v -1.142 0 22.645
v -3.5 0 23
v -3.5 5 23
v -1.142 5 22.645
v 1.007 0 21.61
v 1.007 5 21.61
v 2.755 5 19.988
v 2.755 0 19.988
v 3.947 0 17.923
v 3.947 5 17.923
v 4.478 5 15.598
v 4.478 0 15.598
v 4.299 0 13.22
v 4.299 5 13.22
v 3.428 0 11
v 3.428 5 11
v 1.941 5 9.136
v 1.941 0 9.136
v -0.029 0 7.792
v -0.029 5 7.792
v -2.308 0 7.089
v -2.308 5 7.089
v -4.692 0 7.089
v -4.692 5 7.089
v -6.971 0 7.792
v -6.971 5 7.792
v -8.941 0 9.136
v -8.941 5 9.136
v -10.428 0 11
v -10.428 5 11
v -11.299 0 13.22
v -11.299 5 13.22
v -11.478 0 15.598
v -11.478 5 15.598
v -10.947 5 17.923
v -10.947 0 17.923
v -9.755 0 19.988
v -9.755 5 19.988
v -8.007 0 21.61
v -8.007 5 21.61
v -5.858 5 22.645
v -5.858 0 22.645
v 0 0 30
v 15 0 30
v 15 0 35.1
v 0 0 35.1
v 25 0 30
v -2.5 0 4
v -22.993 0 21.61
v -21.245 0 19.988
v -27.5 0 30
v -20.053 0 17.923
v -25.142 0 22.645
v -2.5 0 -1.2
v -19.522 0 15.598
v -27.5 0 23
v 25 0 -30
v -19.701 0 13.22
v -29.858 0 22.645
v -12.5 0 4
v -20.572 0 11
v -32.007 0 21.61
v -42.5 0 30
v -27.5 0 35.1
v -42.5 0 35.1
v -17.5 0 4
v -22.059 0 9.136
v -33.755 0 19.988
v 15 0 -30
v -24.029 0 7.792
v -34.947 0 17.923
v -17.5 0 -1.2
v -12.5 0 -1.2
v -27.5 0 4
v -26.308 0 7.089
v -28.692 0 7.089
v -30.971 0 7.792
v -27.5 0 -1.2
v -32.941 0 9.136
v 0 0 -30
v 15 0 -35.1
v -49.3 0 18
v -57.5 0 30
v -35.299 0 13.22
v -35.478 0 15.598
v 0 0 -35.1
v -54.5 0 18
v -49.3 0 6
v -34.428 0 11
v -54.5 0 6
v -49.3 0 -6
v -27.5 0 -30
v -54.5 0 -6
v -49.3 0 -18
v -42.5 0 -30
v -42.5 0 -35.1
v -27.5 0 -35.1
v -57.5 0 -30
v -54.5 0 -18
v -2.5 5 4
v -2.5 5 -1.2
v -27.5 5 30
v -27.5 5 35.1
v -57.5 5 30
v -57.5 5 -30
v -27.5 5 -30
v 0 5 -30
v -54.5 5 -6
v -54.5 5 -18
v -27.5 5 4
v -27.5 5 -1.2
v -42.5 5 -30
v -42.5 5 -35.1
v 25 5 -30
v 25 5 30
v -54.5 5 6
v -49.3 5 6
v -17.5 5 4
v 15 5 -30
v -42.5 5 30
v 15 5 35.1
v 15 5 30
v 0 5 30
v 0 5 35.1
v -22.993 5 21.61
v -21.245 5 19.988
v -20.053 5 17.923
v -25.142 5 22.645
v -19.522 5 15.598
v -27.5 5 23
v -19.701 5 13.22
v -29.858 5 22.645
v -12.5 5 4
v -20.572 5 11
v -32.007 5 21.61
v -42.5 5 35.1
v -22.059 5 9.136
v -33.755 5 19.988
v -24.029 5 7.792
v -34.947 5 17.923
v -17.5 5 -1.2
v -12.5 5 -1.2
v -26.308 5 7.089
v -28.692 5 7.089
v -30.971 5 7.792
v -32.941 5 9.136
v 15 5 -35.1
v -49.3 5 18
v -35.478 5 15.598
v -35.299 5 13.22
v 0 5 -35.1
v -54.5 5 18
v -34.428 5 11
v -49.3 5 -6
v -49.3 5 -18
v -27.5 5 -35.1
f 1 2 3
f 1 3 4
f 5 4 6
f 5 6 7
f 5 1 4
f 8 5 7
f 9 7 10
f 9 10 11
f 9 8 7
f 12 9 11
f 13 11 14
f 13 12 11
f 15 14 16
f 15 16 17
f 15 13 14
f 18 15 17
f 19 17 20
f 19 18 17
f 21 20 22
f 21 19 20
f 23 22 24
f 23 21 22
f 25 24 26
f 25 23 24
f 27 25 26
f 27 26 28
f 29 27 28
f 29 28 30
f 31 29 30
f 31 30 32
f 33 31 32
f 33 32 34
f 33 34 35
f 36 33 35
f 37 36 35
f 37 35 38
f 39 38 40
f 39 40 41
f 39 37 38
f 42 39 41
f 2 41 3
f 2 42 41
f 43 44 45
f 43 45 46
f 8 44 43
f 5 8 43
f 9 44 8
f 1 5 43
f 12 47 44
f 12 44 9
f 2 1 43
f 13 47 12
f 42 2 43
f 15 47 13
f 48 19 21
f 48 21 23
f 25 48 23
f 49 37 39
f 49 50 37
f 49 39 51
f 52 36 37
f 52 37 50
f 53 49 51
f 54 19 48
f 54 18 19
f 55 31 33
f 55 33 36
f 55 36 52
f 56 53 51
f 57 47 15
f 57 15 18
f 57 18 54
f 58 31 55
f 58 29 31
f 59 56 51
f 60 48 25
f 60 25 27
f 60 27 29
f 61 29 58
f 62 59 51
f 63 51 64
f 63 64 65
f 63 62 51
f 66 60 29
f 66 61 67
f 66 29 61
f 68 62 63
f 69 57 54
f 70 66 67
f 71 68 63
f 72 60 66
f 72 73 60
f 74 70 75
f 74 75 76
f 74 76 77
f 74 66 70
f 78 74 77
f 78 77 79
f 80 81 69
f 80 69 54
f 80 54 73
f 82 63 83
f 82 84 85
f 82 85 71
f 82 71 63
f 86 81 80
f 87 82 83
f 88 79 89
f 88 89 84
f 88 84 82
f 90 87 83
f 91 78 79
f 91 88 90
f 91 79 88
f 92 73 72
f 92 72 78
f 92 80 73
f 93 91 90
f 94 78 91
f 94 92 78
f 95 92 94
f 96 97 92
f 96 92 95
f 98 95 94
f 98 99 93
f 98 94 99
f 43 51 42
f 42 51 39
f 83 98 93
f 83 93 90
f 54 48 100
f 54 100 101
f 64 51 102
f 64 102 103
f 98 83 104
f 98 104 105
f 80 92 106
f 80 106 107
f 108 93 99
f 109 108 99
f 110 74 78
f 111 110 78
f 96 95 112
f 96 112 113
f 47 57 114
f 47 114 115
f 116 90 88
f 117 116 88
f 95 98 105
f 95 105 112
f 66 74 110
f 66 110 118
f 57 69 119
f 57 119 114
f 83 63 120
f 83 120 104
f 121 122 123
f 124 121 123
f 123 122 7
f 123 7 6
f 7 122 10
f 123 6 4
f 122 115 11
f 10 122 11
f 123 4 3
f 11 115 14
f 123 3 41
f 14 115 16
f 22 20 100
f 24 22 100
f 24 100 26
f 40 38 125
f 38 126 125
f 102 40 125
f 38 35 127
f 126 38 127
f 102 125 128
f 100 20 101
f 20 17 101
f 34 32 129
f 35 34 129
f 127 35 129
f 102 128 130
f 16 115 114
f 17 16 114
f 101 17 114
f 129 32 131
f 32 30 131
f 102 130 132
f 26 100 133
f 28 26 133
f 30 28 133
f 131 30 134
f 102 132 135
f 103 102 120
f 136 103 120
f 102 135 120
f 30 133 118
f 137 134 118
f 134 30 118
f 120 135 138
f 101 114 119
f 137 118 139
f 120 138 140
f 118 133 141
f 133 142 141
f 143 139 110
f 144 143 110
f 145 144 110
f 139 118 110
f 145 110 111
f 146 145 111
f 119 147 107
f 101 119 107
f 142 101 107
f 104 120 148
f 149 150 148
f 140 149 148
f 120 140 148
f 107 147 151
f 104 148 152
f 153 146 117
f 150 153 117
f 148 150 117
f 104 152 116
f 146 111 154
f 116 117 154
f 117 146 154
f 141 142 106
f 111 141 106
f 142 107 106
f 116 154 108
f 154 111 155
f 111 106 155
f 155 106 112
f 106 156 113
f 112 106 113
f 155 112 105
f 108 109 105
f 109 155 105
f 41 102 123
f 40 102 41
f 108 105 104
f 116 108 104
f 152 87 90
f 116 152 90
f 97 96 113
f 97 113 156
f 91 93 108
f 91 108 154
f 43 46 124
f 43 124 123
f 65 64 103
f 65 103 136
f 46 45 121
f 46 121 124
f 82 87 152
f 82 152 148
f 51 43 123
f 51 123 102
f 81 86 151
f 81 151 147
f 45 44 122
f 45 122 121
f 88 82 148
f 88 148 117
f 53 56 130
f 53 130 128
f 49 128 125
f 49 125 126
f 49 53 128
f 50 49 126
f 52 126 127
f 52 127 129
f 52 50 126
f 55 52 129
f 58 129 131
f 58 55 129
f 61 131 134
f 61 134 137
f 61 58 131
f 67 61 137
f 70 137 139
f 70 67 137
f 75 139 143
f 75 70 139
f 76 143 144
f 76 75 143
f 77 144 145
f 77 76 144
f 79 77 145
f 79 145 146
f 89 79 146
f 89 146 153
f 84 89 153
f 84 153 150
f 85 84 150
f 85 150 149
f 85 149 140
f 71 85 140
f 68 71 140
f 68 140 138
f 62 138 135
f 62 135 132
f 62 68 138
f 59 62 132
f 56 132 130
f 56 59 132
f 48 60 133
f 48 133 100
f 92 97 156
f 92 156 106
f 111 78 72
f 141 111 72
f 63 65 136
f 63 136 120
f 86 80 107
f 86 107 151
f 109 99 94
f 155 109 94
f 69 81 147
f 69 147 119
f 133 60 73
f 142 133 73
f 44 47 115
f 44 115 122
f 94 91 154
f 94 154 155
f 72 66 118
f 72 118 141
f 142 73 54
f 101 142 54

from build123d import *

# Parameters (mm, degrees)
SKETCH1_R           = 8
SKETCH1_W           = 10
SKETCH1_H           = 5.2
SKETCH1_W_2         = 5.2
SKETCH1_H_2         = 12
BOSS_EXTRUDE1_DEPTH = 5


with BuildPart() as part:
    # Sketch1 → Boss-Extrude1 (new body)
    with BuildSketch(Plane(origin=(0, 0, 0), x_dir=(1, 0, 0), z_dir=(0, 1, 0))):
        Polygon((25, 30), (25, -30), (15, -30), (15, -35.1), (0, -35.1), (0, -30), (-27.5, -30), (-27.5, -35.1), (-42.5, -35.1), (-42.5, -30), (-57.5, -30), (-57.5, 30), (-42.5, 30), (-42.5, 35.1), (-27.5, 35.1), (-27.5, 30), (0, 30), (0, 35.1), (15, 35.1), (15, 30), align=None)
        with Locations(Location((-27.5, -15, 0), (0, 0, 270))):
            Circle(SKETCH1_R, mode=Mode.SUBTRACT)
        with Locations(Location((-3.5, -15, 0), (0, 0, 270))):
            Circle(SKETCH1_R, mode=Mode.SUBTRACT)
        with Locations((-22.5, -1.4)):
            Rectangle(SKETCH1_W, SKETCH1_H, mode=Mode.SUBTRACT)
        with Locations((-7.5, -1.4)):
            Rectangle(SKETCH1_W, SKETCH1_H, mode=Mode.SUBTRACT)
        with Locations((-51.9, -12)):
            Rectangle(SKETCH1_W_2, SKETCH1_H_2, mode=Mode.SUBTRACT)
        with Locations((-51.9, 12)):
            Rectangle(SKETCH1_W_2, SKETCH1_H_2, mode=Mode.SUBTRACT)
    extrude(amount=BOSS_EXTRUDE1_DEPTH)


solid = part.part
